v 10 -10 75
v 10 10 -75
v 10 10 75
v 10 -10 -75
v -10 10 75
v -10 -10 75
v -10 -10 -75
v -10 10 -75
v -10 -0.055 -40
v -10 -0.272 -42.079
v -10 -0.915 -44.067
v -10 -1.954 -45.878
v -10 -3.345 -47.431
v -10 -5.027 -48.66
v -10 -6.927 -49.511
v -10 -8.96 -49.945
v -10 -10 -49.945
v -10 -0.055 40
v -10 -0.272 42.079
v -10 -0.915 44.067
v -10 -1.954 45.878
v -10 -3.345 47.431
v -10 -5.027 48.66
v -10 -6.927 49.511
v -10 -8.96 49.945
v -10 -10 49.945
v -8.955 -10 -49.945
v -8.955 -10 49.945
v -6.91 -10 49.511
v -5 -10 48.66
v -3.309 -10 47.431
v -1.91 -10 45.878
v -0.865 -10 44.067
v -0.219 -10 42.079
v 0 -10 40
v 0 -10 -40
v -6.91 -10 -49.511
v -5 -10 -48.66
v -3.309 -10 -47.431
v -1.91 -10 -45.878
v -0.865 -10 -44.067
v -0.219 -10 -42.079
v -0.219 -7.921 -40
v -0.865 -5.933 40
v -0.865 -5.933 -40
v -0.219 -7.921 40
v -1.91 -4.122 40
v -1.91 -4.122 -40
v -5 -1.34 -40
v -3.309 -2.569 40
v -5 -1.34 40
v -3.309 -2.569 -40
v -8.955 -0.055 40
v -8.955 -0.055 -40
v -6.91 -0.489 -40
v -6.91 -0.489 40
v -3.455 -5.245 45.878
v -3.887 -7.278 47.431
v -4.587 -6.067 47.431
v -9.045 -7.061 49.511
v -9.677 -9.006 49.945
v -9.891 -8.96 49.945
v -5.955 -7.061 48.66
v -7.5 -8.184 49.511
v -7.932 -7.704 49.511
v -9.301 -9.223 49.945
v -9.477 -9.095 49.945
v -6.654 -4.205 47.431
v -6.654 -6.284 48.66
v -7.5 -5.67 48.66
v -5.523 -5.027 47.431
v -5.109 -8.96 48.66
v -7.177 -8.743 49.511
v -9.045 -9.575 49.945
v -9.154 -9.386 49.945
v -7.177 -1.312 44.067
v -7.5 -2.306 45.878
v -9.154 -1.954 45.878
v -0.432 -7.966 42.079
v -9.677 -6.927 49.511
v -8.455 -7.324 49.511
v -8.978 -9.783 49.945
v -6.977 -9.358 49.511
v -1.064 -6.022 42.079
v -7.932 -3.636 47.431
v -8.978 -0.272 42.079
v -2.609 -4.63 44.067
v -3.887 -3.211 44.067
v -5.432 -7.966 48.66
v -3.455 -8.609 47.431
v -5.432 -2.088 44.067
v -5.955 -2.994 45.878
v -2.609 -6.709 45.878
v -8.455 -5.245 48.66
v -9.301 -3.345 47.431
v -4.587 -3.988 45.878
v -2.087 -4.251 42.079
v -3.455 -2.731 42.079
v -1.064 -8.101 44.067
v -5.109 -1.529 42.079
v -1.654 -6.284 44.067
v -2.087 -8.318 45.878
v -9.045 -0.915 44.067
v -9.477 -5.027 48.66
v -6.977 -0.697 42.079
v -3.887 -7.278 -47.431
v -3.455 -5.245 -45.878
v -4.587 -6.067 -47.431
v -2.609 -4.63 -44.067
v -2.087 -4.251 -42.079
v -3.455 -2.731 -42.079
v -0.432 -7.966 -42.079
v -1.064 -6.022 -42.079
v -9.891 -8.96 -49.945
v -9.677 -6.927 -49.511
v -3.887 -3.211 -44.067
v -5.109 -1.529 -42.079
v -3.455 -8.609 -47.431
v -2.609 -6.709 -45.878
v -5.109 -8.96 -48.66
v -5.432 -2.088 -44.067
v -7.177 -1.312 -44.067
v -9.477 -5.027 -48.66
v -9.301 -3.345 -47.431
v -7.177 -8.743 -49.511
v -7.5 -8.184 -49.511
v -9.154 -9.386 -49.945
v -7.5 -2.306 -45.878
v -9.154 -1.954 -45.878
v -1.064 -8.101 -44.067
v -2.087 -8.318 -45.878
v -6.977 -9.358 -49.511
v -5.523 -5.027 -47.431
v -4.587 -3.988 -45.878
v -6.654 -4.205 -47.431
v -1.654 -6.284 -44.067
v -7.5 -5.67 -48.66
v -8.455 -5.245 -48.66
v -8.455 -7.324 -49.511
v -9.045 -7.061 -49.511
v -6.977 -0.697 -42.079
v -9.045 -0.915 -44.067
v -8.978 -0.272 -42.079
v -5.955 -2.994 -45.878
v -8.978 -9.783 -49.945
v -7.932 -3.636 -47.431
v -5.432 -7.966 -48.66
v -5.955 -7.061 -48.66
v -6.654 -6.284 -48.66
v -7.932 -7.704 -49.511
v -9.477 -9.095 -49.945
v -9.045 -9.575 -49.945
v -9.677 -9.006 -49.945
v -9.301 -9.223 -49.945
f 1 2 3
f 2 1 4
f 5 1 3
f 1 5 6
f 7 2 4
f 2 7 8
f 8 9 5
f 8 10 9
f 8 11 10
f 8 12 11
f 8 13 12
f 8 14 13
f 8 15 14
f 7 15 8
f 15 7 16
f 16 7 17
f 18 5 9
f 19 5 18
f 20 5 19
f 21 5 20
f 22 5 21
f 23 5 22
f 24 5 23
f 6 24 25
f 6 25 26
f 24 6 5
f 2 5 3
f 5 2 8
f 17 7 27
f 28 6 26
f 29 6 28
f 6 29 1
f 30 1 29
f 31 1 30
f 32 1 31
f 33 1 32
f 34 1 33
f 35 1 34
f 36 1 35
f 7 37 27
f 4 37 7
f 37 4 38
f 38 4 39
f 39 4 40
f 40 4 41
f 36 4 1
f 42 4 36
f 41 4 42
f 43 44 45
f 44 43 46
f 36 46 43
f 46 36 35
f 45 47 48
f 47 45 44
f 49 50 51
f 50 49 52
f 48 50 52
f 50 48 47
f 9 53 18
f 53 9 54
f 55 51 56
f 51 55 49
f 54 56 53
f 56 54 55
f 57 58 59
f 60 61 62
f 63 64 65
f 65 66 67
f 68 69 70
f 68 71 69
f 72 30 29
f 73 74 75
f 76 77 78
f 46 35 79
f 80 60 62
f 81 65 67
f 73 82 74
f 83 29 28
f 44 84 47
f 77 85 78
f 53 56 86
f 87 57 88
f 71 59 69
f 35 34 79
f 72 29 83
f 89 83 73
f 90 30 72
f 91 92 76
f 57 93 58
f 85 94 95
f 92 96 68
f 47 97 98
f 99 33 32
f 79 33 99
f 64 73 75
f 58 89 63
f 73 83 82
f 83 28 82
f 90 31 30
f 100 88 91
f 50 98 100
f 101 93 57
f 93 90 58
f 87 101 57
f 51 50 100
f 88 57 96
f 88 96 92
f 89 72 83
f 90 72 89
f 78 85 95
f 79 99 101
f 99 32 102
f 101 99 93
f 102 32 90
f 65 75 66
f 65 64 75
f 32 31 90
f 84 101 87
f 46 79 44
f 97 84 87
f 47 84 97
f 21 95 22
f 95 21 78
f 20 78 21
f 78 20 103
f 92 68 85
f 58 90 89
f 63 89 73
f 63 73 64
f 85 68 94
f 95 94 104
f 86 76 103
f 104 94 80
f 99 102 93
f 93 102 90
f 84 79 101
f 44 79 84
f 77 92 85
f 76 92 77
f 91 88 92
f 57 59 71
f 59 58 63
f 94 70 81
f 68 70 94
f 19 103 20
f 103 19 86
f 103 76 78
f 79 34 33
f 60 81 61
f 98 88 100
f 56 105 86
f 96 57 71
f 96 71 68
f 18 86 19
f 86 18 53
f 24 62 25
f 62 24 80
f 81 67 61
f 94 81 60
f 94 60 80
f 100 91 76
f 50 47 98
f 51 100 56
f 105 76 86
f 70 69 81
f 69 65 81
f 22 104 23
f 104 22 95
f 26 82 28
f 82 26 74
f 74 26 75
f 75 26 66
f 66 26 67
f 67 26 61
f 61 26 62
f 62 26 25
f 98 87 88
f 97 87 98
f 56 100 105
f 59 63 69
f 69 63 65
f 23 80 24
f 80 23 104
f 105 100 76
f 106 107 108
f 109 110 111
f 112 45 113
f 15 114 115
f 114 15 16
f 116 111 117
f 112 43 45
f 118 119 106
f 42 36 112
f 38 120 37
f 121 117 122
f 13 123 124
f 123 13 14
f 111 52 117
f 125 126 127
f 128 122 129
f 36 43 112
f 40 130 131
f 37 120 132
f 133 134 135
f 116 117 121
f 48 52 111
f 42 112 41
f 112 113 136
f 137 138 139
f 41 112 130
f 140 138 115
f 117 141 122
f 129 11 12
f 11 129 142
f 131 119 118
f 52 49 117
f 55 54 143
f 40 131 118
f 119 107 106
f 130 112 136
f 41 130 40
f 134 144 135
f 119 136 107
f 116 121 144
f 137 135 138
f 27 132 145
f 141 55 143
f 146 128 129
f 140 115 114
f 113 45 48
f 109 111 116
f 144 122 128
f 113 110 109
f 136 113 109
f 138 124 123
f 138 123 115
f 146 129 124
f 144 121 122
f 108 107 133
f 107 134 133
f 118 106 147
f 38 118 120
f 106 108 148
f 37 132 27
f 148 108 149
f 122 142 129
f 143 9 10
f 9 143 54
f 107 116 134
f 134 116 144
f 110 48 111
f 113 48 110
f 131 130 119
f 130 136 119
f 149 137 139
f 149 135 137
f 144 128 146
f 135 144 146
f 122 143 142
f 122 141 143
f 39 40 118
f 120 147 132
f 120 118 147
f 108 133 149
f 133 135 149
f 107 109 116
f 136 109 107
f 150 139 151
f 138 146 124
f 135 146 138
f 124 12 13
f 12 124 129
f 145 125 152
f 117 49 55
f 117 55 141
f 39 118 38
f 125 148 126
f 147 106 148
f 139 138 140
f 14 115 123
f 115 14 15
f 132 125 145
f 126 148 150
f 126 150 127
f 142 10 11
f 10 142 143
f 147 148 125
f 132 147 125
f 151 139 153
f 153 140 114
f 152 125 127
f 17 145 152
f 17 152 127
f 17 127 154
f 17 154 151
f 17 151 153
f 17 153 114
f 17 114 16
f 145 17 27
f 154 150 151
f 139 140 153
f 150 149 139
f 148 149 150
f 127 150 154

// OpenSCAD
// Unit of length: Unit.MM
render(convexity = 2)
{
   difference()
   {
      cube(size = [20.0, 20.0, 150.0], center = true);
      translate(v = [-10.0, -10.0, 0.0])
      {
         cylinder(h = 80.0, d = 20.0, center = true);
      }
      translate(v = [-10.0, -10.0, 40.0])
      {
         sphere(r = 10.0);
      }
      translate(v = [-10.0, -10.0, -40.0])
      {
         sphere(r = 10.0);
      }
   }
}
